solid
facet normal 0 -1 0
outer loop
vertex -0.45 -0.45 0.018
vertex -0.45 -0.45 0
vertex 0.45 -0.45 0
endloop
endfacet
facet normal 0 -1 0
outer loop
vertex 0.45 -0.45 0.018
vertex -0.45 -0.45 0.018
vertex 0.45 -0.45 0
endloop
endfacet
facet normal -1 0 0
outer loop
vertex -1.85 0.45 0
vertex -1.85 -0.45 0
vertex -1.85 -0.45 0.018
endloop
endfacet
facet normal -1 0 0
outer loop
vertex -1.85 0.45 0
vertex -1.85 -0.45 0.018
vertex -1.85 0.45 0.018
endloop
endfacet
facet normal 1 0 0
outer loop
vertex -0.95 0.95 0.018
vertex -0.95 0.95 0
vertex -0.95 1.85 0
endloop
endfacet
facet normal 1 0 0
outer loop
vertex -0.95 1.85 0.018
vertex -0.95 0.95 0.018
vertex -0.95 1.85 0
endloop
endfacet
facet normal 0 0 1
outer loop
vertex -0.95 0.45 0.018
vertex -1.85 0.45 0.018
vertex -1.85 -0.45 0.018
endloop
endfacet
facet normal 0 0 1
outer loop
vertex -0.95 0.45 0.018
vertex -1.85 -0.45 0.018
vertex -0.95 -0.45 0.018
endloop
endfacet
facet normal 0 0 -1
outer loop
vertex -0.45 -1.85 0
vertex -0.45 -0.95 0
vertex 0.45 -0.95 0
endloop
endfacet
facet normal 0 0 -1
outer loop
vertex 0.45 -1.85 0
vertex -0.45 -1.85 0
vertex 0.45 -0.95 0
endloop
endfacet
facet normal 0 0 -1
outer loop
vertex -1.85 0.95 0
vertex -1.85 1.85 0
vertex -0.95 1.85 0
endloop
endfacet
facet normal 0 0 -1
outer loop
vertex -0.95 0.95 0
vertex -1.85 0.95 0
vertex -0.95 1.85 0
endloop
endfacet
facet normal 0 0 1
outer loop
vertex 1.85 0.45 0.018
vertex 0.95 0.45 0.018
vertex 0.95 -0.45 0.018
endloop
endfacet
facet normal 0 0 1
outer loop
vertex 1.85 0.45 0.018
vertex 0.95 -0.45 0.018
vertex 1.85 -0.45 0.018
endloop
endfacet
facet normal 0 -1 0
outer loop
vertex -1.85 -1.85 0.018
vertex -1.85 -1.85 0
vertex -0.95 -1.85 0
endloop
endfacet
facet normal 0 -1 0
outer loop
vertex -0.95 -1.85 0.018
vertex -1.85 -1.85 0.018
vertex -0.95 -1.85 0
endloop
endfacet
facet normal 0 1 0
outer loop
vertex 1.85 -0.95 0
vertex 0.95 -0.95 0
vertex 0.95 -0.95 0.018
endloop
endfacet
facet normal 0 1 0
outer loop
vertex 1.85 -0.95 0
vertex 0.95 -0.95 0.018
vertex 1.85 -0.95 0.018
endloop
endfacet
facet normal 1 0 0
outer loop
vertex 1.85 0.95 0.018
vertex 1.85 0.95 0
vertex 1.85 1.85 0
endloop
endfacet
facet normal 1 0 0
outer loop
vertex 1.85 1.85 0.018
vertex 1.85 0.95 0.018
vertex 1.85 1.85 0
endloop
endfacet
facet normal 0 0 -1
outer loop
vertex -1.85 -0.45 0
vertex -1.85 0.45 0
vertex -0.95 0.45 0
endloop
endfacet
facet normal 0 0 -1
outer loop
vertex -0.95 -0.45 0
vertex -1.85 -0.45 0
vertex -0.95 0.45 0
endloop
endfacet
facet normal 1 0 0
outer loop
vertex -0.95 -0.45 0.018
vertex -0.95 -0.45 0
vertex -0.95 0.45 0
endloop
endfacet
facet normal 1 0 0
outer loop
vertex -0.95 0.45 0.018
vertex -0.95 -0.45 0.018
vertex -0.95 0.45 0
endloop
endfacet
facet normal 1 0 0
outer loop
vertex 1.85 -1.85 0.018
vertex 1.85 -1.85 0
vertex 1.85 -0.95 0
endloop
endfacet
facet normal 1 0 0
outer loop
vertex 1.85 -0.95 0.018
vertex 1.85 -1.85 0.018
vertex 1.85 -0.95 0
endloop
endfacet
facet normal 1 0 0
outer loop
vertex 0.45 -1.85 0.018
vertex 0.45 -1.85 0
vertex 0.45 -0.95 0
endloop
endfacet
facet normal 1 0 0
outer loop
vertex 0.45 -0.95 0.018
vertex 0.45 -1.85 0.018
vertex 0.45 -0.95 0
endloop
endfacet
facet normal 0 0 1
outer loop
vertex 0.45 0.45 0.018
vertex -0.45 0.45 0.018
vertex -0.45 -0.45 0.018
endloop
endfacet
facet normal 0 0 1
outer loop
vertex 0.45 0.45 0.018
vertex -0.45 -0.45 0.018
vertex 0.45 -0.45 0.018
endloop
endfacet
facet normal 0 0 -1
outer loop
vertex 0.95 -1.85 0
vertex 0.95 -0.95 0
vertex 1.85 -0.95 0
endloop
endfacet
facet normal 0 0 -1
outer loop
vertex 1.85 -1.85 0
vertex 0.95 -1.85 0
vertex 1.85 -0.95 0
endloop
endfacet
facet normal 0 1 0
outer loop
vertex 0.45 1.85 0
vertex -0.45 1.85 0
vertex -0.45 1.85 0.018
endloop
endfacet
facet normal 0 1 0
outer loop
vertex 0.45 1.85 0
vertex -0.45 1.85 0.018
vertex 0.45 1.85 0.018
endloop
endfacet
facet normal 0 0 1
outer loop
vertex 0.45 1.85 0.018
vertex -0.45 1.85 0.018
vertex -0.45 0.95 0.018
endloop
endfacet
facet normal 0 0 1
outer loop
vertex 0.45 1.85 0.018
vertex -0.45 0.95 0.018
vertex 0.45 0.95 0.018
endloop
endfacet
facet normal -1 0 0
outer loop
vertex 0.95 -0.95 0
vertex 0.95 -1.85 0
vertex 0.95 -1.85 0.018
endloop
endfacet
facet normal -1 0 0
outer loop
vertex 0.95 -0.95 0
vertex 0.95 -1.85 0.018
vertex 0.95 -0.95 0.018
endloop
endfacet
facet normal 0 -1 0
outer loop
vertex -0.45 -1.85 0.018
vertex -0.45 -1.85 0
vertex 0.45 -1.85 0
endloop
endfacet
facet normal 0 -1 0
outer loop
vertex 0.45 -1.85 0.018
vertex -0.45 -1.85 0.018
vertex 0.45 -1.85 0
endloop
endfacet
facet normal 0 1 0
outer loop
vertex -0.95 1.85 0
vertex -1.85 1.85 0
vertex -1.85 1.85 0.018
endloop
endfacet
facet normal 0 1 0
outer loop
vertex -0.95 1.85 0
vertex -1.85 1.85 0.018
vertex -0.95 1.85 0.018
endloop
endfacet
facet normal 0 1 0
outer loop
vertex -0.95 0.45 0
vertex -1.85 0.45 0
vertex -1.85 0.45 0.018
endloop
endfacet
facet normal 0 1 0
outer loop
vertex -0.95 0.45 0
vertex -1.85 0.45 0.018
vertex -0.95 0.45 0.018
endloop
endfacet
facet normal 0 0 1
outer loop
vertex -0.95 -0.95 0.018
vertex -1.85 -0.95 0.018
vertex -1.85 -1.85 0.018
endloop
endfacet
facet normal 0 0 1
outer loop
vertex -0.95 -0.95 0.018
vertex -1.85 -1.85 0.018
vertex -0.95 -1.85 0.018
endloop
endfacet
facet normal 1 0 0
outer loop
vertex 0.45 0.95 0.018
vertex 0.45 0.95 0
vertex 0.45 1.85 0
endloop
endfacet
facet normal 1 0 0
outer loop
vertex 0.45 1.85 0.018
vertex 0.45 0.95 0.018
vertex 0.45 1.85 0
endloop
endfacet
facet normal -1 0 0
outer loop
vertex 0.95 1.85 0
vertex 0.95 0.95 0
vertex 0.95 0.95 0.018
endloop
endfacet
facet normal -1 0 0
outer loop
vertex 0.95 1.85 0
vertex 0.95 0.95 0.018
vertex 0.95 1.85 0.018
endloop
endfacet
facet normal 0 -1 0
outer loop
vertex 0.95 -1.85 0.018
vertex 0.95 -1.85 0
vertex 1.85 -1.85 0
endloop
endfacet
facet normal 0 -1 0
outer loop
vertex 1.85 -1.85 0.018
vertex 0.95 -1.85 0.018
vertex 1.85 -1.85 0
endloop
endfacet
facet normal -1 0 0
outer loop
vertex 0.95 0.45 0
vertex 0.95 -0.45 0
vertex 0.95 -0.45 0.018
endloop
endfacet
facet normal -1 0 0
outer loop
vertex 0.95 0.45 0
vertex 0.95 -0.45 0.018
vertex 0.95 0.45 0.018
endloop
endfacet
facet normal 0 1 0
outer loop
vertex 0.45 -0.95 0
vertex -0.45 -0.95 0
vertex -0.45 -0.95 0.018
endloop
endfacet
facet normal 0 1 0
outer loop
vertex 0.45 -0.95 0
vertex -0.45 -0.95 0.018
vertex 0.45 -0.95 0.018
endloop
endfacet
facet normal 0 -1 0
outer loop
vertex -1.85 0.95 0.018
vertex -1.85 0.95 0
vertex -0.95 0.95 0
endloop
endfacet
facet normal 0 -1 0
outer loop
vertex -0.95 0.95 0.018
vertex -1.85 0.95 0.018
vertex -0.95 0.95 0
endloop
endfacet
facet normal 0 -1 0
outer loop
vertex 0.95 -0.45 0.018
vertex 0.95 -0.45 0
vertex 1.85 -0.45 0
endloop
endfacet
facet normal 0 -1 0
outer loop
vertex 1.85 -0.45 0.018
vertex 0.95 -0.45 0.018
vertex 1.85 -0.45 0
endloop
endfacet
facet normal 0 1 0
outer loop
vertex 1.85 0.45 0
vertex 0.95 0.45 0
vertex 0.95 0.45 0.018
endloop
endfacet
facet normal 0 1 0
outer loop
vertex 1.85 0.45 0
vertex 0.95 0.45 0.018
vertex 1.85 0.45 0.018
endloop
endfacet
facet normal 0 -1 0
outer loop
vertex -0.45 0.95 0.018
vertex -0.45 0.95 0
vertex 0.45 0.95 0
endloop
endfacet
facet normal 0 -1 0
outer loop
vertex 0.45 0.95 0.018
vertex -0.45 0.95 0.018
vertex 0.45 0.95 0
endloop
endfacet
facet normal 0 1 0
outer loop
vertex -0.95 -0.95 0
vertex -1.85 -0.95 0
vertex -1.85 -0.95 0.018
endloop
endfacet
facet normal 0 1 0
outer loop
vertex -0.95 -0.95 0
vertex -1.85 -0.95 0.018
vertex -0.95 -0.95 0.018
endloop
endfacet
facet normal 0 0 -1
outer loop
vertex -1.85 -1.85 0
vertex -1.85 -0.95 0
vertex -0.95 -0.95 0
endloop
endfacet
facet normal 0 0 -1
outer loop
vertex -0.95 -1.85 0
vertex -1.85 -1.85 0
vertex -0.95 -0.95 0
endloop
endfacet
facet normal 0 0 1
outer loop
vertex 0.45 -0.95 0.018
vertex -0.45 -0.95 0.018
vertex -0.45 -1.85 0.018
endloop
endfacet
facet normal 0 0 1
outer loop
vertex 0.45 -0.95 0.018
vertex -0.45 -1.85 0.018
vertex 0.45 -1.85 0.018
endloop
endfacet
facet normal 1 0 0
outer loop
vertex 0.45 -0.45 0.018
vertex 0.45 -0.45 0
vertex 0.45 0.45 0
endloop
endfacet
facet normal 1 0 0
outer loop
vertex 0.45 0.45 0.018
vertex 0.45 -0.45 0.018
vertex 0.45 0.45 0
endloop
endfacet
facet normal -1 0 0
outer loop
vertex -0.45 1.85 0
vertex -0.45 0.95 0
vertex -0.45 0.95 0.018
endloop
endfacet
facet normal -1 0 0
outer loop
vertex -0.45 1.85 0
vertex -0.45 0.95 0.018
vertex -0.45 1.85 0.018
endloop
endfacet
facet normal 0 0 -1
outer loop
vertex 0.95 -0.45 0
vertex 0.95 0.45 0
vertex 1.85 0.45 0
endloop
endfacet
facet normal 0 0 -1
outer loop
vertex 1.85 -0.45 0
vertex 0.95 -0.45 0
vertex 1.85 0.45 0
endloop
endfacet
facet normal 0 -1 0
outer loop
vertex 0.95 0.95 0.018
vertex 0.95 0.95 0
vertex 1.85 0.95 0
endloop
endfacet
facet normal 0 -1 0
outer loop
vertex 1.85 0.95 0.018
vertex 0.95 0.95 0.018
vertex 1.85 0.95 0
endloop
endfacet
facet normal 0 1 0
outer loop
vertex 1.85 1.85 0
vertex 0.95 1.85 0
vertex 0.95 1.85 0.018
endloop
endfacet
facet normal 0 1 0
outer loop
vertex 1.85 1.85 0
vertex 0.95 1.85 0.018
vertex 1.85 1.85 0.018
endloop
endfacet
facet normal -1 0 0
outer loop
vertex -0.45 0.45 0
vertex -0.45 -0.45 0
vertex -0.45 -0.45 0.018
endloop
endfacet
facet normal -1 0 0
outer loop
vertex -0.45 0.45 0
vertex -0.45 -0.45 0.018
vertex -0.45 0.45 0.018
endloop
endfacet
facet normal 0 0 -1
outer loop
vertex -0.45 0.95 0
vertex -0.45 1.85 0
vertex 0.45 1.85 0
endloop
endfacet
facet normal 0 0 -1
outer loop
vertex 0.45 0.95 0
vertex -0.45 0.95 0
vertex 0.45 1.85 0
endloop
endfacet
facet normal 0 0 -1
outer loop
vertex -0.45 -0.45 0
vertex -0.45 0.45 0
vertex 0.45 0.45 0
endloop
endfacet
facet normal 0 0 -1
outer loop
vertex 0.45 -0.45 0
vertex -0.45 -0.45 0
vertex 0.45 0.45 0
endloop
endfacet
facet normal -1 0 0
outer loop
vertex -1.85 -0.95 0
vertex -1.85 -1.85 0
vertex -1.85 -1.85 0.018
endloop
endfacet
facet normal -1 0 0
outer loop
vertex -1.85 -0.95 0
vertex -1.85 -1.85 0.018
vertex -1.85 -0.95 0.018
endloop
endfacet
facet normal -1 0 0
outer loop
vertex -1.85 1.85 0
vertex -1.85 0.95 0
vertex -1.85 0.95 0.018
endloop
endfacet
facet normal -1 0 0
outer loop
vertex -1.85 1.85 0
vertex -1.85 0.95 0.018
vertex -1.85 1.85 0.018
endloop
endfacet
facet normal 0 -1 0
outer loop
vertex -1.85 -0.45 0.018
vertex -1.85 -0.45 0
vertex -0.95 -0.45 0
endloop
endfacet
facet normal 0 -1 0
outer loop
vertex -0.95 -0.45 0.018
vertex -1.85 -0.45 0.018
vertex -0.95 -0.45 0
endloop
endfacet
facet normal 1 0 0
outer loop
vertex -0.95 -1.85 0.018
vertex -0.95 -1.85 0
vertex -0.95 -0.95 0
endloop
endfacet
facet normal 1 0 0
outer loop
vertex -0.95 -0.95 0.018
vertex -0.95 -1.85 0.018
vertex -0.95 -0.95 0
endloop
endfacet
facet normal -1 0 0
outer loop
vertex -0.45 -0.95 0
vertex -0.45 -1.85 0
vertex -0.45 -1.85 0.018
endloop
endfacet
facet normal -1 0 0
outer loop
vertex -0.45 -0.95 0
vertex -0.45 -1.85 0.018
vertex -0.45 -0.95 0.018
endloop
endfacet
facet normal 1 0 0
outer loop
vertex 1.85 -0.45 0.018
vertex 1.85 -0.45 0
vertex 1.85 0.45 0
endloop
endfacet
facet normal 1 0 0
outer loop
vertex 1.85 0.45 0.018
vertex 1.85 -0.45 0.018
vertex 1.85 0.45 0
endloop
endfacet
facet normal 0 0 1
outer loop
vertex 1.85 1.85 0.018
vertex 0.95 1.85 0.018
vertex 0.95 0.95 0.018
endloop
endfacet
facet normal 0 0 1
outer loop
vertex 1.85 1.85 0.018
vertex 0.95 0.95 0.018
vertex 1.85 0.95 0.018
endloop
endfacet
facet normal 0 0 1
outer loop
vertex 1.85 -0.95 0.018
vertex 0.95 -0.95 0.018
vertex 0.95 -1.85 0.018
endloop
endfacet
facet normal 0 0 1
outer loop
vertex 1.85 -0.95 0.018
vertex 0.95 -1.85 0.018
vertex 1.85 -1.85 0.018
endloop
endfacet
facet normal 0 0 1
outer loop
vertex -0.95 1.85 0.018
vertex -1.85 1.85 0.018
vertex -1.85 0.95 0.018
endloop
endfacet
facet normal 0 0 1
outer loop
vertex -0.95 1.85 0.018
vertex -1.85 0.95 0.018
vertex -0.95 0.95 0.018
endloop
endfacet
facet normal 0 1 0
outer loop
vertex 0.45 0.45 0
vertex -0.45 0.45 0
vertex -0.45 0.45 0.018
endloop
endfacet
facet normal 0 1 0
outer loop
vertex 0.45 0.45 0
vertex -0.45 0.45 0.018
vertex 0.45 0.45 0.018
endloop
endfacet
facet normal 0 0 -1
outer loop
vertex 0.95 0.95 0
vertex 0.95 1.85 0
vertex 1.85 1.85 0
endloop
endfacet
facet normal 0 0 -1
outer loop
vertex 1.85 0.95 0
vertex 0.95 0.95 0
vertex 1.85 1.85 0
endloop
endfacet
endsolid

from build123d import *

# Parameters (mm, degrees)
SKICA1_W                  = 0.9
SKICA1_H                  = 0.9
P_IDAT_VYSUNUT_M1_DEPTH   = 0.018
P_IDAT_VYSUNUT_M1_2_DEPTH = 0.018
P_IDAT_VYSUNUT_M1_3_DEPTH = 0.018
P_IDAT_VYSUNUT_M1_4_DEPTH = 0.018
P_IDAT_VYSUNUT_M1_5_DEPTH = 0.018
P_IDAT_VYSUNUT_M1_6_DEPTH = 0.018
P_IDAT_VYSUNUT_M1_7_DEPTH = 0.018
P_IDAT_VYSUNUT_M1_8_DEPTH = 0.018
P_IDAT_VYSUNUT_M1_9_DEPTH = 0.018


with BuildPart() as part:
    # Skica1 → Přidat vysunutím1 (new body)
    with BuildSketch(Plane.XY):
        with Locations((-1.4, 1.4)):
            Rectangle(SKICA1_W, SKICA1_H)
    extrude(amount=P_IDAT_VYSUNUT_M1_DEPTH)


with BuildPart() as body_2:
    # Skica1 → P_idat vysunut_m1 2 (new body)
    with BuildSketch(Plane.XY):
        with Locations((1.4, -1.4)):
            Rectangle(SKICA1_W, SKICA1_H)
    extrude(amount=P_IDAT_VYSUNUT_M1_2_DEPTH)


with BuildPart() as body_3:
    # Skica1 → P_idat vysunut_m1 3 (new body)
    with BuildSketch(Plane.XY):
        with Locations((1.4, 1.4)):
            Rectangle(SKICA1_W, SKICA1_H)
    extrude(amount=P_IDAT_VYSUNUT_M1_3_DEPTH)


with BuildPart() as body_4:
    # Skica1 → P_idat vysunut_m1 4 (new body)
    with BuildSketch(Plane.XY):
        with Locations((-1.4, -1.4)):
            Rectangle(SKICA1_W, SKICA1_H)
    extrude(amount=P_IDAT_VYSUNUT_M1_4_DEPTH)


with BuildPart() as body_5:
    # Skica1 → P_idat vysunut_m1 5 (new body)
    with BuildSketch(Plane.XY):
        with Locations((0, 1.4)):
            Rectangle(SKICA1_W, SKICA1_H)
    extrude(amount=P_IDAT_VYSUNUT_M1_5_DEPTH)


with BuildPart() as body_6:
    # Skica1 → P_idat vysunut_m1 6 (new body)
    with BuildSketch(Plane.XY):
        with Locations((-1.4, 0)):
            Rectangle(SKICA1_W, SKICA1_H)
    extrude(amount=P_IDAT_VYSUNUT_M1_6_DEPTH)


with BuildPart() as body_7:
    # Skica1 → P_idat vysunut_m1 7 (new body)
    with BuildSketch(Plane.XY):
        with Locations((1.4, 0)):
            Rectangle(SKICA1_W, SKICA1_H)
    extrude(amount=P_IDAT_VYSUNUT_M1_7_DEPTH)


with BuildPart() as body_8:
    # Skica1 → P_idat vysunut_m1 8 (new body)
    with BuildSketch(Plane.XY):
        Rectangle(SKICA1_W, SKICA1_H)
    extrude(amount=P_IDAT_VYSUNUT_M1_8_DEPTH)


with BuildPart() as body_9:
    # Skica1 → P_idat vysunut_m1 9 (new body)
    with BuildSketch(Plane.XY):
        with Locations((0, -1.4)):
            Rectangle(SKICA1_W, SKICA1_H)
    extrude(amount=P_IDAT_VYSUNUT_M1_9_DEPTH)


solid = Compound([part.part, body_2.part, body_3.part, body_4.part, body_5.part, body_6.part, body_7.part, body_8.part, body_9.part])
